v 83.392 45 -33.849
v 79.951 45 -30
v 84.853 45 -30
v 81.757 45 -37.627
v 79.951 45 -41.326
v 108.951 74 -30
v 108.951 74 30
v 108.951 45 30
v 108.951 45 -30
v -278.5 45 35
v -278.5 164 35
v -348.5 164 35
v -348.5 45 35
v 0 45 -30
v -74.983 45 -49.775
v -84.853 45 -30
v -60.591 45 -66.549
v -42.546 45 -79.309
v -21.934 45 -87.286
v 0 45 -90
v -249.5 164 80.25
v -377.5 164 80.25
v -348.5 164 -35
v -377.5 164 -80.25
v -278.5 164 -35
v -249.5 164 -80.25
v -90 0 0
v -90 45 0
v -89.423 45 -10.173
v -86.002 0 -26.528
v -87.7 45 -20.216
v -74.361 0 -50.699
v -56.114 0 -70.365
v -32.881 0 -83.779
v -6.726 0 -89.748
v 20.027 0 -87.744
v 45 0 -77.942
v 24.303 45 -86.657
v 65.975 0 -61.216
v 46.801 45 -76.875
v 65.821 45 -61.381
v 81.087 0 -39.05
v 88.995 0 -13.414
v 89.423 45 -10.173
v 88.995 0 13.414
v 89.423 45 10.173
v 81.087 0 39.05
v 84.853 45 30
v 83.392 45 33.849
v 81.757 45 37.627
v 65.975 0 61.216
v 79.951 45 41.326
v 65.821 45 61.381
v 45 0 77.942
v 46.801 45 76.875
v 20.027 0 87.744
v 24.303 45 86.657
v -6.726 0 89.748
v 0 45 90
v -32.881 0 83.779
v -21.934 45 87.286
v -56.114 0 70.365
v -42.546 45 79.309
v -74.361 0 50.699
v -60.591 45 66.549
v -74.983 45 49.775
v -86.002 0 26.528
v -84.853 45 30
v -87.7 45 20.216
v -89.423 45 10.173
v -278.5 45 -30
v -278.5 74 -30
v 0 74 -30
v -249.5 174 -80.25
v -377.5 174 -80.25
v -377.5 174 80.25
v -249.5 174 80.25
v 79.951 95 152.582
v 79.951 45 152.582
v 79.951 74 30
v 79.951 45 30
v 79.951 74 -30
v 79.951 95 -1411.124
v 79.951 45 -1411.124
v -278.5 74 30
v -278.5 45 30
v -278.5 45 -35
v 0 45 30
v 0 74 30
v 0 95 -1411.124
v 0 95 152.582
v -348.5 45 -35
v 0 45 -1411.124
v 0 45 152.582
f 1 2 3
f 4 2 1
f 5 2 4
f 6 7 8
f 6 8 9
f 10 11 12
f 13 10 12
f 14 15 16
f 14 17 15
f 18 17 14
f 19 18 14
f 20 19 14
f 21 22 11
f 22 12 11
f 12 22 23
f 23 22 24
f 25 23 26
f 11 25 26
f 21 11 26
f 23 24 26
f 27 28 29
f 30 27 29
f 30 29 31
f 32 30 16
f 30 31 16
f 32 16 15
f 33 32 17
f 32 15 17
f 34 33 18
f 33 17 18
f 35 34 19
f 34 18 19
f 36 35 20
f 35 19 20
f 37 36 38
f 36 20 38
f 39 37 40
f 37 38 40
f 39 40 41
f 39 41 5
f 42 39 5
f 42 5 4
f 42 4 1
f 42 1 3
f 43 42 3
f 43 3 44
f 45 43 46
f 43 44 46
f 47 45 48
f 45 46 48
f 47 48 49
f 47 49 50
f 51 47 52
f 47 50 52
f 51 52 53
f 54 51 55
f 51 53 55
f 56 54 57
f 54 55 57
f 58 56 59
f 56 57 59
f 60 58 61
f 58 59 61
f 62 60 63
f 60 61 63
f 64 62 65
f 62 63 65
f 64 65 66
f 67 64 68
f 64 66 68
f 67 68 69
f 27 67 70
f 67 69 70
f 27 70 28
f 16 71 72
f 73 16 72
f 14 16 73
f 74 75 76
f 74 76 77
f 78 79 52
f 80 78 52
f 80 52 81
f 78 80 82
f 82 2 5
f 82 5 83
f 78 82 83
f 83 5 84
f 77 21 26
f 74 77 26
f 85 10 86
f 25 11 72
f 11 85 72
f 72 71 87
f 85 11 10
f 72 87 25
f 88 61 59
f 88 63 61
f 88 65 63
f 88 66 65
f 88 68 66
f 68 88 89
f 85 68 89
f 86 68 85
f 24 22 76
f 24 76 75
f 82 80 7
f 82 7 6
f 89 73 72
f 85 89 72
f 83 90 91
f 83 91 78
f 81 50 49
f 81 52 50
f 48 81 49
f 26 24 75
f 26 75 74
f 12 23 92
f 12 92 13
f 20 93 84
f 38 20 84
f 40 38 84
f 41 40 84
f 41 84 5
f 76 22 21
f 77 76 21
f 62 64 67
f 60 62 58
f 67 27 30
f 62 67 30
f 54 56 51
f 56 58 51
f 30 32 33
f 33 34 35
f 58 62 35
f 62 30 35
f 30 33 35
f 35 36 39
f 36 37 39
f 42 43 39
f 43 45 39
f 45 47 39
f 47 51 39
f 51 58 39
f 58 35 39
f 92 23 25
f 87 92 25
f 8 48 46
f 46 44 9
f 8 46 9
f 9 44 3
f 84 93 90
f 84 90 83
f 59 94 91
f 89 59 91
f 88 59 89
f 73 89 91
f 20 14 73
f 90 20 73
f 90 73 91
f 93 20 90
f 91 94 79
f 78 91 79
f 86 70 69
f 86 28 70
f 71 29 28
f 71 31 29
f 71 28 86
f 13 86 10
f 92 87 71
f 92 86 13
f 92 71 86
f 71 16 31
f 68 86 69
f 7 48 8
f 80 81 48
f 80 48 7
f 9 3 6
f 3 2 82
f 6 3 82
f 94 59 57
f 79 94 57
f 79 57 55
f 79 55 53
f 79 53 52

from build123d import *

# Parameters (mm, degrees)
ESQUISSE1_W        = 90
ESQUISSE1_H        = 45
ESQUISSE2_W        = 79.950738566
ESQUISSE2_H        = 1563.706247811
BOSS_EXTRU_1_DEPTH = 50
BOSS_EXTRU_2_DEPTH = 29
ESQUISSE5_W        = 60
ESQUISSE5_H        = 29
BOSS_EXTRU_3_DEPTH = 29
BOSS_EXTRU_4_DEPTH = 90
ESQUISSE9_W        = 128
ESQUISSE9_H        = 160.5
BOSS_EXTRU_5_DEPTH = 10


with BuildPart() as part:
    # Esquisse1 → Révolution1 (revolve)
    with BuildSketch(Plane.XY, mode=Mode.PRIVATE) as r_volution1_sk:
        with Locations((45, 22.5)):
            Rectangle(ESQUISSE1_W, ESQUISSE1_H)
    revolve(r_volution1_sk.sketch.rotate(Axis((0, 45, 0), (0, -1, 0)), 180), axis=Axis((0, 45, 0), (0, -1, 0)))

    # Esquisse2 → Boss.-Extru.1 (add)
    with BuildSketch(Plane(origin=(0, 45, 0), x_dir=(1, 0, 0), z_dir=(0, 1, 0))):
        with Locations((39.975369283, 629.271080586)):
            Rectangle(ESQUISSE2_W, ESQUISSE2_H)
    extrude(amount=BOSS_EXTRU_1_DEPTH)

    # Esquisse3 → Boss.-Extru.2 (add)
    with BuildSketch(Plane(origin=(0, 45, 0), x_dir=(1, 0, 0), z_dir=(0, 1, 0))):
        Polygon((-278.5, 30), (0, 30), (0, -30), (-278.5, -30), (-278.5, -35), (-348.5, -35), (-348.5, -30), (-348.5, 30), (-348.5, 35), (-278.5, 35), align=None)
    extrude(amount=BOSS_EXTRU_2_DEPTH)

    # Esquisse5 → Boss.-Extru.3 (add)
    with BuildSketch(Plane(origin=(79.950738566, 0, 0), x_dir=(0, 0, -1), z_dir=(1, 0, 0))):
        with Locations((0, 59.5)):
            Rectangle(ESQUISSE5_W, ESQUISSE5_H)
    extrude(amount=BOSS_EXTRU_3_DEPTH)

    # Esquisse6 → Boss.-Extru.4 (add)
    with BuildSketch(Plane(origin=(0, 74, 0), x_dir=(1, 0, 0), z_dir=(0, 1, 0))):
        Polygon((-348.5, 35), (-278.5, 35), (-278.5, -30), (-278.5, -35), (-348.5, -35), (-348.5, -30), align=None)
    extrude(amount=BOSS_EXTRU_4_DEPTH)

    # Esquisse9 → Boss.-Extru.5 (add)
    with BuildSketch(Plane(origin=(0, 164, 0), x_dir=(1, 0, 0), z_dir=(0, 1, 0))):
        with Locations((-313.5, 0)):
            Rectangle(ESQUISSE9_W, ESQUISSE9_H)
    extrude(amount=BOSS_EXTRU_5_DEPTH)


solid = part.part
